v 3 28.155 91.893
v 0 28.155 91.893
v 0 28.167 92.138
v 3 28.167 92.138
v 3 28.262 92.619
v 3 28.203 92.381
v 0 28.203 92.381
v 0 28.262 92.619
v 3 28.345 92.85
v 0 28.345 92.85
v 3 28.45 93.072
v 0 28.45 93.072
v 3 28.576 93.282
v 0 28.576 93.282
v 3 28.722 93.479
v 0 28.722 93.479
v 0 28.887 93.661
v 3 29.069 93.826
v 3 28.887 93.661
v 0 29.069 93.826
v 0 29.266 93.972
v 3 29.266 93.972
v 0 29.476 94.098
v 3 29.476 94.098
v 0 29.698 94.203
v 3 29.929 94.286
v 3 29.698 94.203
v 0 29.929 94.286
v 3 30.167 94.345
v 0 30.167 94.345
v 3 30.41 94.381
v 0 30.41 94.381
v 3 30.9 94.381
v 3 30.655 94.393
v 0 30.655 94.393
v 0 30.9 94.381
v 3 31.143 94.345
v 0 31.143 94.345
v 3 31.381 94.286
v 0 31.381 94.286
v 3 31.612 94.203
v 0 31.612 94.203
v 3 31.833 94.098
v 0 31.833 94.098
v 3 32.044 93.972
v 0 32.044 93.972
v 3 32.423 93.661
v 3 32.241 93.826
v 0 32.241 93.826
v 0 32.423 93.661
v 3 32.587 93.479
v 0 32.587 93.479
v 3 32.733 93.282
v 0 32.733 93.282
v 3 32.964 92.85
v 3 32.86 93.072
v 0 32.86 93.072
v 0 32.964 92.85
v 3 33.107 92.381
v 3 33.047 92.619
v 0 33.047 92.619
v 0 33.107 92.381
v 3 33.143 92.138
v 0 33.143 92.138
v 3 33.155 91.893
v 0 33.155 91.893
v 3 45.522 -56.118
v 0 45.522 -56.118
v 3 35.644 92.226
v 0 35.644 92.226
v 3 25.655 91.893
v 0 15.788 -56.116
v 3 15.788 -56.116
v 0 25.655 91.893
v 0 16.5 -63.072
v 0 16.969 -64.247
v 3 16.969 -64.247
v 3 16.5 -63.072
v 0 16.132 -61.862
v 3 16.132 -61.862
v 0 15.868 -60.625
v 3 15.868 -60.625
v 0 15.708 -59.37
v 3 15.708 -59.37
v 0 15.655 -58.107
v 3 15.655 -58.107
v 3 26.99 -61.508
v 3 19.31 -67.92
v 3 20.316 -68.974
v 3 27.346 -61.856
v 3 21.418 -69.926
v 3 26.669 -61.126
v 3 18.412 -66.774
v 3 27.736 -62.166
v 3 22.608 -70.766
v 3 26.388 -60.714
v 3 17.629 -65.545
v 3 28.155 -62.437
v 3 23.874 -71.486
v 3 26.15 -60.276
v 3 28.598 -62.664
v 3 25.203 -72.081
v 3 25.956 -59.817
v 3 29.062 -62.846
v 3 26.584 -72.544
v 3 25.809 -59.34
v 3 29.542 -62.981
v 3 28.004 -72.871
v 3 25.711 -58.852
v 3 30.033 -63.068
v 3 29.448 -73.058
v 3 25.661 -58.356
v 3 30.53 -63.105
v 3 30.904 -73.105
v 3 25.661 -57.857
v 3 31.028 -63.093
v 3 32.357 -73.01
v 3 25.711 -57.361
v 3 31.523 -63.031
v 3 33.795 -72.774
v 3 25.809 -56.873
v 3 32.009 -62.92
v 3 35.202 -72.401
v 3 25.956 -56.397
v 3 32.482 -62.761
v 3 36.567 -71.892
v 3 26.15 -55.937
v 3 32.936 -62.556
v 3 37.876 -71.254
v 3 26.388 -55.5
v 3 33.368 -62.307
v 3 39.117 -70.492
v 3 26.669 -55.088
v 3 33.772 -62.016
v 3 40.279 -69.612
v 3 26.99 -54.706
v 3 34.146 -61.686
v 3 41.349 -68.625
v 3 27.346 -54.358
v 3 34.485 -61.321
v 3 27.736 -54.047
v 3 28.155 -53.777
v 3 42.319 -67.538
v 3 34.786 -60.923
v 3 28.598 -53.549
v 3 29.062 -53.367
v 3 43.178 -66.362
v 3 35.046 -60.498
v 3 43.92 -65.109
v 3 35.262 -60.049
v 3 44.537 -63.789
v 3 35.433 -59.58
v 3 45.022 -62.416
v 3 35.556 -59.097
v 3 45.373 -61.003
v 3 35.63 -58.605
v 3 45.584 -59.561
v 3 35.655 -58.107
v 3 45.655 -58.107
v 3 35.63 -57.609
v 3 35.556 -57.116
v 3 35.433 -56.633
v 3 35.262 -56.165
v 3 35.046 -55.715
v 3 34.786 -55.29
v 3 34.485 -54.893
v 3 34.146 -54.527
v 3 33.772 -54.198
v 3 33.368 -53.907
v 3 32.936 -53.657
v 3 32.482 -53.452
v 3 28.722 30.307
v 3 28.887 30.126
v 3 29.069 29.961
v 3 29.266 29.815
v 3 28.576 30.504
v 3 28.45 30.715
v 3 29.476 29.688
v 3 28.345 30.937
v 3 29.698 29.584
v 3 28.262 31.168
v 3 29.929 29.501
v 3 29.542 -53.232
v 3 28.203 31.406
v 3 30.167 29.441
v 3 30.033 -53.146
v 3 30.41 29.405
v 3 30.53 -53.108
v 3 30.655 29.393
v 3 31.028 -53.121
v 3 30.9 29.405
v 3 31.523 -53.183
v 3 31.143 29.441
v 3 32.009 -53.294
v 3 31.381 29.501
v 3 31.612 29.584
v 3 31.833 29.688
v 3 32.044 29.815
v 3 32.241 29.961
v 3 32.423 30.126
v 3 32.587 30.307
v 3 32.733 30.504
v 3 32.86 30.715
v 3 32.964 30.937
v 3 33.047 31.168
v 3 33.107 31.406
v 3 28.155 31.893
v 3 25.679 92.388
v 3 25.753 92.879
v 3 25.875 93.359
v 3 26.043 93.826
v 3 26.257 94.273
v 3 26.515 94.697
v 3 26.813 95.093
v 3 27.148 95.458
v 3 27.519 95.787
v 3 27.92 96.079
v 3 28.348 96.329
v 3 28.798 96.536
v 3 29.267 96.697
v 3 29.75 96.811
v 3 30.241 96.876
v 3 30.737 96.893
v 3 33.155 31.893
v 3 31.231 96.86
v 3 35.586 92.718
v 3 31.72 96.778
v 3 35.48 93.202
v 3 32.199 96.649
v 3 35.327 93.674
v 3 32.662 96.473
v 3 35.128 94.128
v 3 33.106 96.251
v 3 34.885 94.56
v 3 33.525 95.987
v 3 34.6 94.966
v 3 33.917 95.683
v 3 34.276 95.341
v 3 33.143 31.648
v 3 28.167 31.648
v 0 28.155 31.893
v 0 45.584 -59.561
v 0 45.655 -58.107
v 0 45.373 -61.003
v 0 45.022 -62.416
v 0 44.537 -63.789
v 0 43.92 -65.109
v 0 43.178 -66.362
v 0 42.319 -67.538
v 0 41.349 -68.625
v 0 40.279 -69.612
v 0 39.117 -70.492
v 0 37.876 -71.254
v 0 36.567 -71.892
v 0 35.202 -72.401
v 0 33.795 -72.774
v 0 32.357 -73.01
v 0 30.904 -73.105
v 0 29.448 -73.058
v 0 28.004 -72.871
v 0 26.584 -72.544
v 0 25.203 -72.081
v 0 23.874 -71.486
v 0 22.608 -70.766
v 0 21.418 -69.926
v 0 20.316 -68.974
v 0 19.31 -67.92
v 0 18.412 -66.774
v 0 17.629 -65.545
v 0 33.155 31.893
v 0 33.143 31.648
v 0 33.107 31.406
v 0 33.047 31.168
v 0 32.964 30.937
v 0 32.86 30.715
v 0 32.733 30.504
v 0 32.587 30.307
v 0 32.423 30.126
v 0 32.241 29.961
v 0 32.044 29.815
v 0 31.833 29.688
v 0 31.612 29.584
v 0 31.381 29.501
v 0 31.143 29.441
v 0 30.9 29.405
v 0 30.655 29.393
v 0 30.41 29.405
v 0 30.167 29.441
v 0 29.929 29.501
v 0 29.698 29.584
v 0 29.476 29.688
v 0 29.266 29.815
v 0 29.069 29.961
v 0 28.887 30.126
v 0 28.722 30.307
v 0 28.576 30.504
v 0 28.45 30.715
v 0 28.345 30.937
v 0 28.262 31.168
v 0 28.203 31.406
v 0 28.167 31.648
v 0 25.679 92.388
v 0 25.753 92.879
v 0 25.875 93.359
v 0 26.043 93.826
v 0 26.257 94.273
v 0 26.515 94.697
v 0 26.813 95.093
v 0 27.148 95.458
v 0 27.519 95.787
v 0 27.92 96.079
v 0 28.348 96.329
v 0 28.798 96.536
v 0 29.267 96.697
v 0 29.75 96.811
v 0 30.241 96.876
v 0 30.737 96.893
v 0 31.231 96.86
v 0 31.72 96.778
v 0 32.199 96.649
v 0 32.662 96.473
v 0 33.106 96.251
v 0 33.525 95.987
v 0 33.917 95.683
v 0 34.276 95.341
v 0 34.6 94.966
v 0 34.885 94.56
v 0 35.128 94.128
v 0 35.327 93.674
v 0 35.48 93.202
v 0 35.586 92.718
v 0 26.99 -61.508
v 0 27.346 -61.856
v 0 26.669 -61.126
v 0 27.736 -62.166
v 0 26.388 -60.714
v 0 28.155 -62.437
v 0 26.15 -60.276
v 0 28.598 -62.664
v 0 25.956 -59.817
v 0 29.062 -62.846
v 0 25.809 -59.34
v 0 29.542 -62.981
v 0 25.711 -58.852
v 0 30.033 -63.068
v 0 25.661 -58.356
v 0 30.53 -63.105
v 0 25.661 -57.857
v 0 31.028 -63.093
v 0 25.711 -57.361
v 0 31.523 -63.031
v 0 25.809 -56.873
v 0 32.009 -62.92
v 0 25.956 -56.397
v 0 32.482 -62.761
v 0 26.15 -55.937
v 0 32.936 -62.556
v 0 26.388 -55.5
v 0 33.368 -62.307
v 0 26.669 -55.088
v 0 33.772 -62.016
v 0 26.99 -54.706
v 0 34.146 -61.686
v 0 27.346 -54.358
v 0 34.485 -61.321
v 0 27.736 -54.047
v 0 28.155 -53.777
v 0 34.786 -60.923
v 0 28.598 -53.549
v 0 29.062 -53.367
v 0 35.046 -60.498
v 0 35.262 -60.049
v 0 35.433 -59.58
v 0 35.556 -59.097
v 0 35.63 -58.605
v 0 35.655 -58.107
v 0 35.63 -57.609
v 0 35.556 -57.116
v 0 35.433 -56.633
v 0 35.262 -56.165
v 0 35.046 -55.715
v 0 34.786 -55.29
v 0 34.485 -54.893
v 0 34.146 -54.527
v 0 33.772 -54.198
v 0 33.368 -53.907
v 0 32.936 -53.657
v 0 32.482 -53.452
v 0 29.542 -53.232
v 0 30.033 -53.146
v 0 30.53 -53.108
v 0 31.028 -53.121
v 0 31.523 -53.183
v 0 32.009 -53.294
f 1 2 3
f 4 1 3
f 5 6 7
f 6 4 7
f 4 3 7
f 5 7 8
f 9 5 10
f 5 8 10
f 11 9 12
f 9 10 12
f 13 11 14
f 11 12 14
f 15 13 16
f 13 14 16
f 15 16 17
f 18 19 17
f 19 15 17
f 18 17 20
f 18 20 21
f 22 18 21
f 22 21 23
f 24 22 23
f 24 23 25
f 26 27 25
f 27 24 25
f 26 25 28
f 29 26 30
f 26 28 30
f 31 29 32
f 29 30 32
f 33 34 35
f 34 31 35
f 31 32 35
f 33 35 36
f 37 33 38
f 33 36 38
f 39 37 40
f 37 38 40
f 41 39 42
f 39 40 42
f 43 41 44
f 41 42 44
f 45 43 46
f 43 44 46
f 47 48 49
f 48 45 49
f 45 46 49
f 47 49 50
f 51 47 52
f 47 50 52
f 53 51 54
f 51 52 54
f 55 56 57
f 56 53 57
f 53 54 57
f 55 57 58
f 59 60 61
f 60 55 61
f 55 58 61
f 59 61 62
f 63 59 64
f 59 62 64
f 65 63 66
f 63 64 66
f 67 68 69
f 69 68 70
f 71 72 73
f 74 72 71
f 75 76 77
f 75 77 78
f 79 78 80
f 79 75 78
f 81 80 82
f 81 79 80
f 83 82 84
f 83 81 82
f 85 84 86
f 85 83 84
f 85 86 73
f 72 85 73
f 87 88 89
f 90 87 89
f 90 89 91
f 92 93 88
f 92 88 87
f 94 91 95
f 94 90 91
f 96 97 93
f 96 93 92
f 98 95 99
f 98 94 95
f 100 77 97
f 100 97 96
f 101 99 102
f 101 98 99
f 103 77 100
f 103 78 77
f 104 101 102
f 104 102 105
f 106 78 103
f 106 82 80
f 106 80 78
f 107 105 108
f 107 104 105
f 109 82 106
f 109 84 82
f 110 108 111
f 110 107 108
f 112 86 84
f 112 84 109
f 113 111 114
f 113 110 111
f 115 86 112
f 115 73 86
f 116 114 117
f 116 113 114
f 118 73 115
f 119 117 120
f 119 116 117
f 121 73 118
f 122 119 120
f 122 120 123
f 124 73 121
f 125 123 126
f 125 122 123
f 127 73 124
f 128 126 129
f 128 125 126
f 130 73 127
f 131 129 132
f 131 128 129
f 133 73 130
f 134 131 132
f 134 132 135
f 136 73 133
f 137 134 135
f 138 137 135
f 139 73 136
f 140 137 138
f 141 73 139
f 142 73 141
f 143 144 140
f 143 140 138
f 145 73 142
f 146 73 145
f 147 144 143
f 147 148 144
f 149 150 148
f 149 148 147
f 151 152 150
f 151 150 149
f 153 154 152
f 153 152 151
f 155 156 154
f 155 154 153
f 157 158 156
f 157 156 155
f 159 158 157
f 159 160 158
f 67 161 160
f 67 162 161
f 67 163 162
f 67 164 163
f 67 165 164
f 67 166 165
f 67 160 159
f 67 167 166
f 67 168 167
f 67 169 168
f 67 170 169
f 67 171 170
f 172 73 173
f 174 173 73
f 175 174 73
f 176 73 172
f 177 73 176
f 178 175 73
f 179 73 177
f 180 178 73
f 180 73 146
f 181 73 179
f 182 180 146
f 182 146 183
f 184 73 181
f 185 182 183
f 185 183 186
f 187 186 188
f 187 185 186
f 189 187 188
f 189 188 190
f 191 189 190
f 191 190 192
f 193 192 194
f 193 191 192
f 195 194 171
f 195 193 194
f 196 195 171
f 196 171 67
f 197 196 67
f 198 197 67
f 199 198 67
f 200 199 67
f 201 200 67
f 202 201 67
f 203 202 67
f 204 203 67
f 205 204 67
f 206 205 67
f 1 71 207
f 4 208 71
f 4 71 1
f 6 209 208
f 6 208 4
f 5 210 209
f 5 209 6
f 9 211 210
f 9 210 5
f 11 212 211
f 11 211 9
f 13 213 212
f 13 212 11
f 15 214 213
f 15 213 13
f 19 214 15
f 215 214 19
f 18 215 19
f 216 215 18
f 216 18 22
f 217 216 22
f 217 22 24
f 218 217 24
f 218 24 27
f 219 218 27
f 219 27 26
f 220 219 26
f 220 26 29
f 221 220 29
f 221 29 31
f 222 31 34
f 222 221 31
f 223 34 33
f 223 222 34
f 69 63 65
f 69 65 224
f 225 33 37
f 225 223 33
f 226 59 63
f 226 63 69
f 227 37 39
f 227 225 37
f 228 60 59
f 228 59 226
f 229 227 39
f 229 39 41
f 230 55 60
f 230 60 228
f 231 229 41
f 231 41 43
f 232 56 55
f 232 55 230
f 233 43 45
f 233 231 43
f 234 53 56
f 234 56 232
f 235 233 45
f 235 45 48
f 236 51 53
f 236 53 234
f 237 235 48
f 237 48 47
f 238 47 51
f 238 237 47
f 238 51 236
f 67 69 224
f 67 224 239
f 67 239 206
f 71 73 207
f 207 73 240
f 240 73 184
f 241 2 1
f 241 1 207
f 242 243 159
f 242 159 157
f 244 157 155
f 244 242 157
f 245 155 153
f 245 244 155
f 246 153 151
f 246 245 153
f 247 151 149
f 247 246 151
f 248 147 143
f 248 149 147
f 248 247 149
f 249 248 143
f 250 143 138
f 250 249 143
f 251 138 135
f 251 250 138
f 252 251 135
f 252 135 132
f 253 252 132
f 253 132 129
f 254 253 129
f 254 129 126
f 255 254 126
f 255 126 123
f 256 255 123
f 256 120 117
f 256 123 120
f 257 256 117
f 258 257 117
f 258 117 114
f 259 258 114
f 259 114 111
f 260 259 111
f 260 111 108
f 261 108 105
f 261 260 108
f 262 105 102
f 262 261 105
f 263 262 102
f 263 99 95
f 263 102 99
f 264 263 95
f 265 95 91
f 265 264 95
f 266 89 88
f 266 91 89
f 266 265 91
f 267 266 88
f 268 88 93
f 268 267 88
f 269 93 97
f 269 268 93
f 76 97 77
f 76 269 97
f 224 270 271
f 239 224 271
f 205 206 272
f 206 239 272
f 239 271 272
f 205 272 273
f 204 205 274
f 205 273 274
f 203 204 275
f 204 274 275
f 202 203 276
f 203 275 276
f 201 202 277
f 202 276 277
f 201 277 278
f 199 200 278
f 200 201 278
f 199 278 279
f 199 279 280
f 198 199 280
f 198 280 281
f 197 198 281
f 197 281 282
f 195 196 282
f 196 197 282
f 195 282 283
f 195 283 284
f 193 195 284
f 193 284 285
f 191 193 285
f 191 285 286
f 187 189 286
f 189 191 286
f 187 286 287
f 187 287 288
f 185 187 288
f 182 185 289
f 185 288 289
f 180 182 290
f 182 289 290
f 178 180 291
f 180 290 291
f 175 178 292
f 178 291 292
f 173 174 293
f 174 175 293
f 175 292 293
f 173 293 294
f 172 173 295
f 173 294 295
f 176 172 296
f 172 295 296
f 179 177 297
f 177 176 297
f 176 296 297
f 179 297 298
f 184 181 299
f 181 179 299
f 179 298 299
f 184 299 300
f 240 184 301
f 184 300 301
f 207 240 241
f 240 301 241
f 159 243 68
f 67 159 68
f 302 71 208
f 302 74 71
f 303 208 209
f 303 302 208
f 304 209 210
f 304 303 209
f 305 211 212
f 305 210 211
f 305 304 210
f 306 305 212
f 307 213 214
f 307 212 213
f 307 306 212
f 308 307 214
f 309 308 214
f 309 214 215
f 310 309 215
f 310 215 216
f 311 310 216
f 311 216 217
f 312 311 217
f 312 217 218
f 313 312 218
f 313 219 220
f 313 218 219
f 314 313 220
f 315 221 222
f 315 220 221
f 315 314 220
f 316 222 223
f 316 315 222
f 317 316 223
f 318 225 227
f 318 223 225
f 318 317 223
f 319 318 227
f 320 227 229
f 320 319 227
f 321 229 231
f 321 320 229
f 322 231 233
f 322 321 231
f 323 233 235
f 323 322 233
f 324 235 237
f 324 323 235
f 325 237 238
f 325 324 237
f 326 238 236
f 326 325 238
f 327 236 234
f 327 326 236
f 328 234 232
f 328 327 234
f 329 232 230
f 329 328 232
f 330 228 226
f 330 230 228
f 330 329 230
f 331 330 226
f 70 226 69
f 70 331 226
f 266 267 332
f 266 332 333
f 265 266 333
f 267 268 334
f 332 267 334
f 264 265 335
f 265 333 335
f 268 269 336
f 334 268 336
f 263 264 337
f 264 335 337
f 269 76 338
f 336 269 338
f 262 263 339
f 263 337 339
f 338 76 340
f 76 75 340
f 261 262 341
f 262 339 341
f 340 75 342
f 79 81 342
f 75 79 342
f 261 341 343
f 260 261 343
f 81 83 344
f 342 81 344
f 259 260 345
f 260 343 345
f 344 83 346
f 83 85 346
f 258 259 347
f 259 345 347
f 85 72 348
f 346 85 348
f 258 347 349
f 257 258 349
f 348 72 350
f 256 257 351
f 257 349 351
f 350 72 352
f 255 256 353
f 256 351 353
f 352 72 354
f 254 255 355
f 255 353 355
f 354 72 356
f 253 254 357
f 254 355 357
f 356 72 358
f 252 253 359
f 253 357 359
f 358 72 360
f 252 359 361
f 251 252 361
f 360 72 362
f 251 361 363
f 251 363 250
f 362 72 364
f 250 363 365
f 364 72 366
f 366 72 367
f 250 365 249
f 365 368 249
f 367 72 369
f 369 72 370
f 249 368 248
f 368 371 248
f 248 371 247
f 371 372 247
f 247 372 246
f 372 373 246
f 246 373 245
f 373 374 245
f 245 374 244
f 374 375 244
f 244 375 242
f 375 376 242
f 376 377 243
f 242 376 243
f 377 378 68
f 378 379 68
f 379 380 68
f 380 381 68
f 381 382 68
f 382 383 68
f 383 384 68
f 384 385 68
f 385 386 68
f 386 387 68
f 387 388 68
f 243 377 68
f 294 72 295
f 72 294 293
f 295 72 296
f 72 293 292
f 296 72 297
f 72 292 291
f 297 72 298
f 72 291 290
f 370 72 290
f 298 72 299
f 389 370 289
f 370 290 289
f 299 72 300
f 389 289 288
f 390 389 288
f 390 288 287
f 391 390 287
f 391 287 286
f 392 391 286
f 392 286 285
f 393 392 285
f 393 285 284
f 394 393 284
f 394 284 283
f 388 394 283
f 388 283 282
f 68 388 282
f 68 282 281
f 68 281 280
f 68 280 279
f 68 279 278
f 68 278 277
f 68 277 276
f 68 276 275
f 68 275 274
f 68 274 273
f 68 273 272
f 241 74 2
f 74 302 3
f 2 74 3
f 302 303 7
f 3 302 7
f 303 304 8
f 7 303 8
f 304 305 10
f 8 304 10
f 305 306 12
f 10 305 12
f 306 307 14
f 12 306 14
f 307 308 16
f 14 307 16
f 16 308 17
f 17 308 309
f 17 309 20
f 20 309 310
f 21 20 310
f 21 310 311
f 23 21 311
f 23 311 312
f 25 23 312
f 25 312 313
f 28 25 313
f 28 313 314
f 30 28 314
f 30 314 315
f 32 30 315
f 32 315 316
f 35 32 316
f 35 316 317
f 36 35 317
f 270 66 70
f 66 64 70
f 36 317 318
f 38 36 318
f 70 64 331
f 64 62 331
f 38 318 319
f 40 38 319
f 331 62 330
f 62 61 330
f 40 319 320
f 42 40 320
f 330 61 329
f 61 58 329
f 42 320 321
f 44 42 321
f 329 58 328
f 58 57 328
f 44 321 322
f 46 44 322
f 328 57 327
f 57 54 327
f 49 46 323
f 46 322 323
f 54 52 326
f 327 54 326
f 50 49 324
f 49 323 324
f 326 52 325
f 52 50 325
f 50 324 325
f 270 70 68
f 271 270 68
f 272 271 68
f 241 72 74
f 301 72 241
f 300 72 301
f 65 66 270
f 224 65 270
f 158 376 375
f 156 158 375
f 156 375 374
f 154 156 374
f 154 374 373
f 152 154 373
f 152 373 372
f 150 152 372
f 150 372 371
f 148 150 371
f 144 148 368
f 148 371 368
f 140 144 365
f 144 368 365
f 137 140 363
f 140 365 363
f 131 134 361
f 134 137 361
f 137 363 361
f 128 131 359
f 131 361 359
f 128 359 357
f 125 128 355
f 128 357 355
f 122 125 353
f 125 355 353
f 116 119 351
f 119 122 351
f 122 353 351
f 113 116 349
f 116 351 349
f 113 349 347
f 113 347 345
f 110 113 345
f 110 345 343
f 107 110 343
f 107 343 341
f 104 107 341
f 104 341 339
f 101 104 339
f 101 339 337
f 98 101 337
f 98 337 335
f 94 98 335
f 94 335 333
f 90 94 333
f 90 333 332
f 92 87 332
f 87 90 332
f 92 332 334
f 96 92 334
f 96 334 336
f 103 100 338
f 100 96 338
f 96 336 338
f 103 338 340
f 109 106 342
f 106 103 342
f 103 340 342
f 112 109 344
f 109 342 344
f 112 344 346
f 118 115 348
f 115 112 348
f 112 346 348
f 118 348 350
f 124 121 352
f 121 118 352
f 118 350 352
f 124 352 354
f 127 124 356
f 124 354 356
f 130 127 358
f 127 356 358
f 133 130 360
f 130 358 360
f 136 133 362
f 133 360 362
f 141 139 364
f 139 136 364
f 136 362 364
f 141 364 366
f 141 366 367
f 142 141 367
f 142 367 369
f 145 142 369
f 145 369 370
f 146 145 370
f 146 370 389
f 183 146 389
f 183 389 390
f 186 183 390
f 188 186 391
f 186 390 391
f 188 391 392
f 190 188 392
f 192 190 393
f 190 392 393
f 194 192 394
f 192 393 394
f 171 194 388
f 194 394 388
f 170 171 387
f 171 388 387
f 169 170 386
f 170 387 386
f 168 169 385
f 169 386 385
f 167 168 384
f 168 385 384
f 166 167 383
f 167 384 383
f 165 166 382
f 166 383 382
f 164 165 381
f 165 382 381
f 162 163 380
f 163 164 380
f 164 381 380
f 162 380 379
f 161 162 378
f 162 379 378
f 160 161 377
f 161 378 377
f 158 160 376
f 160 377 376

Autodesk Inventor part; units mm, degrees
ref_plane "YZ Plane" through (0, 0, 0) normal (1, 0, 0) x (0, 1, 0)
ref_plane "XZ Plane" through (0, 0, 0) normal (0, 1, 0) x (-1, 0, 0)
ref_plane "XY Plane" through (0, 0, 0) normal (0, 0, 1) x (1, 0, 0)
sketch "Boceto1" plane through (0, 30.6548, -58.1067) normal (1, 0, 0) x (0, 1, 0)
  arc A0 (-13.6856, -6.1404) -> (15, 0) centre (0, 0) ccw
  arc A1 (-13.6856, -6.1404) -> (14.8675, 1.989) centre (0, 0) ccw
  arc A2 (-13.6856, -6.1404) -> (15, 0) centre (0, 0) ccw
  circle A3 centre (0, 0) radius 5
  arc A4 (-14.8673, 1.9912) -> (14.8675, 1.989) centre (0, 0) ccw
  arc A5 (-2.5, 90) -> (2.5, 90) centre (0, 90) ccw
  arc A6 (2.5, 150) -> (-2.5, 150) centre (0, 150) ccw
  line L0 (2.5, 150) -> (2.5, 90)
  line L1 (-2.5, 150) -> (-2.5, 90)
  line L2 (15, 0) -> (4.989, 150.3322)
  line L3 (-15, 0) -> (-5, 150)
  arc A7 (4.989, 150.3322) -> (-5, 150) centre (0, 150) ccw
  point P0 (15, 0)
  point P1 (15, 0)
extrude "Extrusión1" add sketch "Boceto1" along normal blind 3 contours A4 L3 A7 L2 A0
properties part number "CorrederaPalanca"
